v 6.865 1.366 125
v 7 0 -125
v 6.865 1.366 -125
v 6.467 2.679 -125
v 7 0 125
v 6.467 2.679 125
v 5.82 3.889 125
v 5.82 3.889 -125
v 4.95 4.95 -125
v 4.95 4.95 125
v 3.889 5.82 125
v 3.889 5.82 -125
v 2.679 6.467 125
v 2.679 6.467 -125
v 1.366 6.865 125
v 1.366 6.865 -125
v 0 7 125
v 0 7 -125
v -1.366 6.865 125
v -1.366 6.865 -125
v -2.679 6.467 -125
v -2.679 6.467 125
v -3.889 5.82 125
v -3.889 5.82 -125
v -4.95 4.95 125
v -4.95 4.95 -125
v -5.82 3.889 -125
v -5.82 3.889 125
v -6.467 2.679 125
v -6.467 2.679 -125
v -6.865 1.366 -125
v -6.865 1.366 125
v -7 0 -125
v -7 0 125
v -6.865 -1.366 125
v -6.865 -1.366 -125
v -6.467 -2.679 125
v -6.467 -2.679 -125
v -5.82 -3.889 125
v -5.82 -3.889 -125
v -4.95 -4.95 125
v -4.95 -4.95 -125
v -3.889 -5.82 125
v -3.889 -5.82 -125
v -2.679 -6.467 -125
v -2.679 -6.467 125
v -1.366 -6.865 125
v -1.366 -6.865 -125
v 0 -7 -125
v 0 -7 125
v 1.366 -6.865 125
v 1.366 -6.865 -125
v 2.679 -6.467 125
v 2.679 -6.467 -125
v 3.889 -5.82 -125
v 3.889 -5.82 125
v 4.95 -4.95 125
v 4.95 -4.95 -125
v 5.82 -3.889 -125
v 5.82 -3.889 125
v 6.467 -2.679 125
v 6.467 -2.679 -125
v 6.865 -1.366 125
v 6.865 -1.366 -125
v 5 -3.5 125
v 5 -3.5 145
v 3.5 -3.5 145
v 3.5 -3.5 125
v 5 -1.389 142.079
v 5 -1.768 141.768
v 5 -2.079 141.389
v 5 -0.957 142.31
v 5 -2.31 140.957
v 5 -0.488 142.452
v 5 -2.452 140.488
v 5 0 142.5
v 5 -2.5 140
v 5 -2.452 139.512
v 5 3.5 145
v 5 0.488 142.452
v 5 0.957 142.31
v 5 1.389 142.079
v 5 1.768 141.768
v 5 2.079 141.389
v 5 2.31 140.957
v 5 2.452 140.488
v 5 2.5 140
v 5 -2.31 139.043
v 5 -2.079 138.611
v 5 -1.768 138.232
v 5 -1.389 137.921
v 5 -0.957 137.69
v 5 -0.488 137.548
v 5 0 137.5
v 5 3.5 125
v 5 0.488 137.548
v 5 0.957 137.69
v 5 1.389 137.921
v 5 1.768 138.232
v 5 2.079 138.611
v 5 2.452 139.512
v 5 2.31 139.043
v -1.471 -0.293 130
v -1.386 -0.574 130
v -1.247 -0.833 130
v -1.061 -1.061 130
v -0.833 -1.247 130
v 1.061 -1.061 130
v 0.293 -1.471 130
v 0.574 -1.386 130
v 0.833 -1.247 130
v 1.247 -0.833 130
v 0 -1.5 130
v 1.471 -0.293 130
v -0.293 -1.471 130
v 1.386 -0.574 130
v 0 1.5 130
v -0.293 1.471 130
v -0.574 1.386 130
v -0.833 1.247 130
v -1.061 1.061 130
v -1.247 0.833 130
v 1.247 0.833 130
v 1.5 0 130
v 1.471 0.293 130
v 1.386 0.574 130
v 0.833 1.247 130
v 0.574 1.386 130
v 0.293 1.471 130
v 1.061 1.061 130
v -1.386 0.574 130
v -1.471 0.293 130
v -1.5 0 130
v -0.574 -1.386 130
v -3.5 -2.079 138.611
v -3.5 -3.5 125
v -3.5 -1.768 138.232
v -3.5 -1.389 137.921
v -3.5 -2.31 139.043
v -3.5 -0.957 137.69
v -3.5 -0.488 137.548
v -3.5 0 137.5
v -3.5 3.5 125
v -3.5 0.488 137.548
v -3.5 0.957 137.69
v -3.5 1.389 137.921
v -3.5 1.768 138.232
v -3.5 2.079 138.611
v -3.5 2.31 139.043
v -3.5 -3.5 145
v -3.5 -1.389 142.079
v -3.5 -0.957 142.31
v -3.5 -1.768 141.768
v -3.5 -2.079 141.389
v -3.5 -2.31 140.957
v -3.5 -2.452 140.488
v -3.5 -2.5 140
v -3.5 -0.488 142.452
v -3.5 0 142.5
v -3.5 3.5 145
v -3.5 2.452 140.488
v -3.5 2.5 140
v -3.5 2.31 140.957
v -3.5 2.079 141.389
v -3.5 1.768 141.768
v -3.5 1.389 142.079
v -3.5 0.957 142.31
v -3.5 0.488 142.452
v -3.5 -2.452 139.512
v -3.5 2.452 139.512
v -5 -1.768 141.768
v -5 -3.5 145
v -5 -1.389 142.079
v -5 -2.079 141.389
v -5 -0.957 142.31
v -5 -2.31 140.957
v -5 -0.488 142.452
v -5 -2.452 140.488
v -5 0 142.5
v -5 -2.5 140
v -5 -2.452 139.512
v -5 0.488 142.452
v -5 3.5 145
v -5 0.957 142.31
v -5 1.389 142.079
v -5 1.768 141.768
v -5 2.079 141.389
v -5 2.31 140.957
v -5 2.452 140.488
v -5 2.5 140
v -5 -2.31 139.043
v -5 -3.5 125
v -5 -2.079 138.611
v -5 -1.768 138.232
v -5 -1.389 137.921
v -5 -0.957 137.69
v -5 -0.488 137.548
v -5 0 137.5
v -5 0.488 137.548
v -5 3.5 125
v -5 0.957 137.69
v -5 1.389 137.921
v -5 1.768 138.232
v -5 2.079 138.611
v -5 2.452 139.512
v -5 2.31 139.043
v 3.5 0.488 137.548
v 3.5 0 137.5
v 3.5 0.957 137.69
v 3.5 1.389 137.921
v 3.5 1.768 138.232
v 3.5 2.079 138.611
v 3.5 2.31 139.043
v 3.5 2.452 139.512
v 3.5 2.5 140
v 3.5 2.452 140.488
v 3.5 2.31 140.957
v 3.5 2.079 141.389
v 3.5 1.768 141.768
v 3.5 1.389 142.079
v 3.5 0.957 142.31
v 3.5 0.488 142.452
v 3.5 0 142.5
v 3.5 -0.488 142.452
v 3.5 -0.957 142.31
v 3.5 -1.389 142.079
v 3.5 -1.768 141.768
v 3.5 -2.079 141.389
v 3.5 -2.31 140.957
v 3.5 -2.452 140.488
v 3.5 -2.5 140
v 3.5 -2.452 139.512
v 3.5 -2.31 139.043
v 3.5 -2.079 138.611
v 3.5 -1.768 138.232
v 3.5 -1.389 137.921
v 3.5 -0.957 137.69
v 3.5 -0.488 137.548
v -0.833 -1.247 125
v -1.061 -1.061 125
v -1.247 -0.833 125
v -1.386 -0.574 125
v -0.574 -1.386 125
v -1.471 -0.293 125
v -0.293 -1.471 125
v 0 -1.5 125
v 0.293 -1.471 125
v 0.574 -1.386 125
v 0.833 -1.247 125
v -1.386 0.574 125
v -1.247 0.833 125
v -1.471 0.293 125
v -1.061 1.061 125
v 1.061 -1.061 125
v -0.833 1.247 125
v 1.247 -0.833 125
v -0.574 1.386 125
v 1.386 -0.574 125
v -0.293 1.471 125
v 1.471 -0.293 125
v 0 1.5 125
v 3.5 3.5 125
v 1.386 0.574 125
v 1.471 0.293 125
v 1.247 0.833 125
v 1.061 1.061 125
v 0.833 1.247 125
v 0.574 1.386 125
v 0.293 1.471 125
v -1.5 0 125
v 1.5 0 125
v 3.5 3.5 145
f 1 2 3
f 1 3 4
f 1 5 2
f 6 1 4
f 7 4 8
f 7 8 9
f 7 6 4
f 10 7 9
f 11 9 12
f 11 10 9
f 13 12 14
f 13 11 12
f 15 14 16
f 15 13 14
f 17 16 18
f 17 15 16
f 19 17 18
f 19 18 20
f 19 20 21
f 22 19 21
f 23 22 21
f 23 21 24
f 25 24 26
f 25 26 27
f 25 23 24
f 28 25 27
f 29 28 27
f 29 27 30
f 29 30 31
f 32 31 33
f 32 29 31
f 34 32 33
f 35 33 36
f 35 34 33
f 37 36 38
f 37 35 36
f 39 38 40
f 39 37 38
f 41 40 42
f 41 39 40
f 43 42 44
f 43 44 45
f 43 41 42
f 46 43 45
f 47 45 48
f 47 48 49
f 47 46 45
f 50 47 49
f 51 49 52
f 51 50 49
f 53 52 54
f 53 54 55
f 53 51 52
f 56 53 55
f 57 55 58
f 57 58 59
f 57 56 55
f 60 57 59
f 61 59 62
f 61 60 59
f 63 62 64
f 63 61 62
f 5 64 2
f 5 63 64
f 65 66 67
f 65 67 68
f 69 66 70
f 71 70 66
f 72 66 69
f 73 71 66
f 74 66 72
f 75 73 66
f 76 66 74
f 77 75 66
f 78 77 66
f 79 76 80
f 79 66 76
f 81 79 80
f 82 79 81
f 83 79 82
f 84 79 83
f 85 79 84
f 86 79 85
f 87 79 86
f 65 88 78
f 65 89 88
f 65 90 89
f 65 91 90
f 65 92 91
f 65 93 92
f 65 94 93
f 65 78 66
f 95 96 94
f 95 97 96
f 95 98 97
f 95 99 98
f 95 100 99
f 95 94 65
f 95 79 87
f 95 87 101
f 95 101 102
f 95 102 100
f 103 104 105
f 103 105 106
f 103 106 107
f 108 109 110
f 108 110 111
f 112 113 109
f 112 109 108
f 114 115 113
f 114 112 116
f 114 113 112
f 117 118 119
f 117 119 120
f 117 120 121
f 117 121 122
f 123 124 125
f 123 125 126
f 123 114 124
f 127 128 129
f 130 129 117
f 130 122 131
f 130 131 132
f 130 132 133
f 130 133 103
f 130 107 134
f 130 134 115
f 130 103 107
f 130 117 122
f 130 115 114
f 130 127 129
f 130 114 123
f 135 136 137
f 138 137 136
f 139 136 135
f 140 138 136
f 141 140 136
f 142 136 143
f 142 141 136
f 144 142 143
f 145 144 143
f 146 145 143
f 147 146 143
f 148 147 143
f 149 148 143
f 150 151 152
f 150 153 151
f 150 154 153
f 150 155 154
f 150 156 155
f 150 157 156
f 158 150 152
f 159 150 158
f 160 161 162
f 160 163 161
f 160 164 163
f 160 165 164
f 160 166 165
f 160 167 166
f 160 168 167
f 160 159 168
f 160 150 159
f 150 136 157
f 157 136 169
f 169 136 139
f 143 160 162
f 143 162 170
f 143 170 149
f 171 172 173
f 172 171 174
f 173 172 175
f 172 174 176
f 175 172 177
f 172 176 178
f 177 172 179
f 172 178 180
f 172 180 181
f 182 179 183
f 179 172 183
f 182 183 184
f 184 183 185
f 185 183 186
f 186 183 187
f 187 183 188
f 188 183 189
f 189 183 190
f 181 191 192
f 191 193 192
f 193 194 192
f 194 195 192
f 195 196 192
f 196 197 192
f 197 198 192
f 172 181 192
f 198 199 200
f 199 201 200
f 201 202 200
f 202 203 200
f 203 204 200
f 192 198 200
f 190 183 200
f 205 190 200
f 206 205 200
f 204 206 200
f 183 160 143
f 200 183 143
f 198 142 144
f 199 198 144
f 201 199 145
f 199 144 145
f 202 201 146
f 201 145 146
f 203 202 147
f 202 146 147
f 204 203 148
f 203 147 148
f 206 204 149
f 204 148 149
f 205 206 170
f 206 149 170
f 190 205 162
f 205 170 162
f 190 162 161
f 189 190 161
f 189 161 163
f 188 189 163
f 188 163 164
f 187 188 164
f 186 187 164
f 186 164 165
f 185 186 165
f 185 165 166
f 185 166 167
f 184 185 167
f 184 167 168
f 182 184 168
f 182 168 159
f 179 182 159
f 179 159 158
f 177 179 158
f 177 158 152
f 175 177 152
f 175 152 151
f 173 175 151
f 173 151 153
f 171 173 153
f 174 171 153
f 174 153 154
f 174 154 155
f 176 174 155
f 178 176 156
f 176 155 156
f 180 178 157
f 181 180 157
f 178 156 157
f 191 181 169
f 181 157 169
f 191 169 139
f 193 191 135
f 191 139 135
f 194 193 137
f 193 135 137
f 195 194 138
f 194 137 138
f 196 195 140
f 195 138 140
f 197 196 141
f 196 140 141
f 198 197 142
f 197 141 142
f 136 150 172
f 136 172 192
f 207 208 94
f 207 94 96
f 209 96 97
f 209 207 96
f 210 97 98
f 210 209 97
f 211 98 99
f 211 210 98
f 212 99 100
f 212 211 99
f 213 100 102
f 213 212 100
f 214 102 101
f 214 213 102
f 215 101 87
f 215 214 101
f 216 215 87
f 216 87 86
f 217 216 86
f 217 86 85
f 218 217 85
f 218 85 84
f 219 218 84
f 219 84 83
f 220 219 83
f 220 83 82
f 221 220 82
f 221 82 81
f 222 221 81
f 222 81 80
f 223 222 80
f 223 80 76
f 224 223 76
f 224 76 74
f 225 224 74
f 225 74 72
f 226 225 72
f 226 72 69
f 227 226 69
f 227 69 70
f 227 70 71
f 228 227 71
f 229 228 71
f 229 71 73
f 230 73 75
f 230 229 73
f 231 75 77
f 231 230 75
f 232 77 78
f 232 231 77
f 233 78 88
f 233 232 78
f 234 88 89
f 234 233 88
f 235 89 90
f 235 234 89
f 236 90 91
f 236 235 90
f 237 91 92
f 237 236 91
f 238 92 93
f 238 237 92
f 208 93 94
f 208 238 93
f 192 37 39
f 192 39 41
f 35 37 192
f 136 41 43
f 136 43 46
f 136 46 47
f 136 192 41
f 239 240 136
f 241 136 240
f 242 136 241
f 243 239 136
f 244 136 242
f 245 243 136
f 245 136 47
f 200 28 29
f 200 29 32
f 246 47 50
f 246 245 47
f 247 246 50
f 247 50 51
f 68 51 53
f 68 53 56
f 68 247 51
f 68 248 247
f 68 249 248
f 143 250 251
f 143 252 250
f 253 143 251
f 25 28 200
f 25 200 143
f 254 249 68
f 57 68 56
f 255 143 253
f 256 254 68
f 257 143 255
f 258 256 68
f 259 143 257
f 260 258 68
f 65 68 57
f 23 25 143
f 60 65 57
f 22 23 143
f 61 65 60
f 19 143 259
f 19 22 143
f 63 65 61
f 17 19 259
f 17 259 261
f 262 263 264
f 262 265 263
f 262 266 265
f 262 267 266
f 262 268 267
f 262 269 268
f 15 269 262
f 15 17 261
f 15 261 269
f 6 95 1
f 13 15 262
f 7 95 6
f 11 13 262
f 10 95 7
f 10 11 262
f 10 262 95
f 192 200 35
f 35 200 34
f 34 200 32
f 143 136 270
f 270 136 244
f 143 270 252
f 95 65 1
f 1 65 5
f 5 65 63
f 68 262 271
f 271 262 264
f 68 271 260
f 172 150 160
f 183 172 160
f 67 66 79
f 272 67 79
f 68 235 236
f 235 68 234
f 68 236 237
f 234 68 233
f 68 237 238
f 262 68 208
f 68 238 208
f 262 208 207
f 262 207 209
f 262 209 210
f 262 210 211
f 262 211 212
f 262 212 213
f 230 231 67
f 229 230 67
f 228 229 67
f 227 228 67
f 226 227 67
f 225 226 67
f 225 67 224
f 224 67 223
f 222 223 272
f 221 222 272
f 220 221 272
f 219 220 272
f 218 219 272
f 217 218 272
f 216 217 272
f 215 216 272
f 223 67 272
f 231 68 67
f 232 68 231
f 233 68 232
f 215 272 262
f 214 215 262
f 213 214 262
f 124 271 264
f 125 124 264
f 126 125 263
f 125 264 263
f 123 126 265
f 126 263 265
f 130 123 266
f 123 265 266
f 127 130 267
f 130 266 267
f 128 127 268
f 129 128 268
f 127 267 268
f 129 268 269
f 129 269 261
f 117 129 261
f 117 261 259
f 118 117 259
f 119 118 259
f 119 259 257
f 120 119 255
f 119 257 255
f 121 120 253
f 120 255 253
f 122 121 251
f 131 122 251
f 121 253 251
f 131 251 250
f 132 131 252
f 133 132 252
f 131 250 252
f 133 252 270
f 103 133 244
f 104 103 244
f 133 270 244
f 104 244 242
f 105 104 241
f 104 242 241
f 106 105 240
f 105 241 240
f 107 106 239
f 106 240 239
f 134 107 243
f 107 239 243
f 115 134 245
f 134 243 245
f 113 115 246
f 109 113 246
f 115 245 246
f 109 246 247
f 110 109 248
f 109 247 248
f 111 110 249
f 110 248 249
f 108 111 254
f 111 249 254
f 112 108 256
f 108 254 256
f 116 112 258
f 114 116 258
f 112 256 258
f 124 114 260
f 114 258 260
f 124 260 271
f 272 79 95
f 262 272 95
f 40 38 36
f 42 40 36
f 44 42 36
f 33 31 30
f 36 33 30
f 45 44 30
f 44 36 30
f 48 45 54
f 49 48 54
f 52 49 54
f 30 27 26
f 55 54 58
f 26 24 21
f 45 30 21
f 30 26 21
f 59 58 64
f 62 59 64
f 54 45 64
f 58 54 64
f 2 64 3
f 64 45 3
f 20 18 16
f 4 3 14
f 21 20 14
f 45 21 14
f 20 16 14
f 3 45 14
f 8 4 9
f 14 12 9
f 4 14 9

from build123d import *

# Parameters (mm, degrees)
SKETCH1_R                = 7
BOSS_EXTRUDE1_DEPTH      = 125
BOSS_EXTRUDE1_DEPTH_BACK = 125
SKETCH2_W                = 20
SKETCH2_H                = 7
SKETCH2_R                = 2.5
BOSS_EXTRUDE2_DEPTH      = 5
BOSS_EXTRUDE2_DEPTH_BACK = 5
SKETCH4_W                = 7
SKETCH4_H                = 7
CUT_EXTRUDE1_DEPTH       = 20
SKETCH5_R                = 1.5
BOSS_EXTRUDE3_DEPTH      = 5


with BuildPart() as part:
    # Sketch1 → Boss-Extrude1 (new body, two sides)
    with BuildSketch(Plane.XY) as boss_extrude1_sk:
        Circle(SKETCH1_R)
    extrude(amount=BOSS_EXTRUDE1_DEPTH)
    extrude(boss_extrude1_sk.sketch, amount=-BOSS_EXTRUDE1_DEPTH_BACK)

    # Sketch2 → Boss-Extrude2 (add, two sides)
    with BuildSketch(Plane(origin=(0, 0, 0), x_dir=(0, 0, -1), z_dir=(1, 0, 0))) as boss_extrude2_sk:
        with Locations((-135, 0)):
            Rectangle(SKETCH2_W, SKETCH2_H)
        with Locations((-140, 0)):
            Circle(SKETCH2_R, mode=Mode.SUBTRACT)
    extrude(amount=BOSS_EXTRUDE2_DEPTH)
    extrude(boss_extrude2_sk.sketch, amount=-BOSS_EXTRUDE2_DEPTH_BACK)

    # Sketch4 → Cut-Extrude1 (cut)
    with BuildSketch(Plane.XY.offset(145)):
        Rectangle(SKETCH4_W, SKETCH4_H)
    extrude(amount=-CUT_EXTRUDE1_DEPTH, mode=Mode.SUBTRACT)

    # Sketch5 → Boss-Extrude3 (add)
    with BuildSketch(Plane.XY.offset(125)):
        Circle(SKETCH5_R)
    extrude(amount=BOSS_EXTRUDE3_DEPTH)


solid = part.part
